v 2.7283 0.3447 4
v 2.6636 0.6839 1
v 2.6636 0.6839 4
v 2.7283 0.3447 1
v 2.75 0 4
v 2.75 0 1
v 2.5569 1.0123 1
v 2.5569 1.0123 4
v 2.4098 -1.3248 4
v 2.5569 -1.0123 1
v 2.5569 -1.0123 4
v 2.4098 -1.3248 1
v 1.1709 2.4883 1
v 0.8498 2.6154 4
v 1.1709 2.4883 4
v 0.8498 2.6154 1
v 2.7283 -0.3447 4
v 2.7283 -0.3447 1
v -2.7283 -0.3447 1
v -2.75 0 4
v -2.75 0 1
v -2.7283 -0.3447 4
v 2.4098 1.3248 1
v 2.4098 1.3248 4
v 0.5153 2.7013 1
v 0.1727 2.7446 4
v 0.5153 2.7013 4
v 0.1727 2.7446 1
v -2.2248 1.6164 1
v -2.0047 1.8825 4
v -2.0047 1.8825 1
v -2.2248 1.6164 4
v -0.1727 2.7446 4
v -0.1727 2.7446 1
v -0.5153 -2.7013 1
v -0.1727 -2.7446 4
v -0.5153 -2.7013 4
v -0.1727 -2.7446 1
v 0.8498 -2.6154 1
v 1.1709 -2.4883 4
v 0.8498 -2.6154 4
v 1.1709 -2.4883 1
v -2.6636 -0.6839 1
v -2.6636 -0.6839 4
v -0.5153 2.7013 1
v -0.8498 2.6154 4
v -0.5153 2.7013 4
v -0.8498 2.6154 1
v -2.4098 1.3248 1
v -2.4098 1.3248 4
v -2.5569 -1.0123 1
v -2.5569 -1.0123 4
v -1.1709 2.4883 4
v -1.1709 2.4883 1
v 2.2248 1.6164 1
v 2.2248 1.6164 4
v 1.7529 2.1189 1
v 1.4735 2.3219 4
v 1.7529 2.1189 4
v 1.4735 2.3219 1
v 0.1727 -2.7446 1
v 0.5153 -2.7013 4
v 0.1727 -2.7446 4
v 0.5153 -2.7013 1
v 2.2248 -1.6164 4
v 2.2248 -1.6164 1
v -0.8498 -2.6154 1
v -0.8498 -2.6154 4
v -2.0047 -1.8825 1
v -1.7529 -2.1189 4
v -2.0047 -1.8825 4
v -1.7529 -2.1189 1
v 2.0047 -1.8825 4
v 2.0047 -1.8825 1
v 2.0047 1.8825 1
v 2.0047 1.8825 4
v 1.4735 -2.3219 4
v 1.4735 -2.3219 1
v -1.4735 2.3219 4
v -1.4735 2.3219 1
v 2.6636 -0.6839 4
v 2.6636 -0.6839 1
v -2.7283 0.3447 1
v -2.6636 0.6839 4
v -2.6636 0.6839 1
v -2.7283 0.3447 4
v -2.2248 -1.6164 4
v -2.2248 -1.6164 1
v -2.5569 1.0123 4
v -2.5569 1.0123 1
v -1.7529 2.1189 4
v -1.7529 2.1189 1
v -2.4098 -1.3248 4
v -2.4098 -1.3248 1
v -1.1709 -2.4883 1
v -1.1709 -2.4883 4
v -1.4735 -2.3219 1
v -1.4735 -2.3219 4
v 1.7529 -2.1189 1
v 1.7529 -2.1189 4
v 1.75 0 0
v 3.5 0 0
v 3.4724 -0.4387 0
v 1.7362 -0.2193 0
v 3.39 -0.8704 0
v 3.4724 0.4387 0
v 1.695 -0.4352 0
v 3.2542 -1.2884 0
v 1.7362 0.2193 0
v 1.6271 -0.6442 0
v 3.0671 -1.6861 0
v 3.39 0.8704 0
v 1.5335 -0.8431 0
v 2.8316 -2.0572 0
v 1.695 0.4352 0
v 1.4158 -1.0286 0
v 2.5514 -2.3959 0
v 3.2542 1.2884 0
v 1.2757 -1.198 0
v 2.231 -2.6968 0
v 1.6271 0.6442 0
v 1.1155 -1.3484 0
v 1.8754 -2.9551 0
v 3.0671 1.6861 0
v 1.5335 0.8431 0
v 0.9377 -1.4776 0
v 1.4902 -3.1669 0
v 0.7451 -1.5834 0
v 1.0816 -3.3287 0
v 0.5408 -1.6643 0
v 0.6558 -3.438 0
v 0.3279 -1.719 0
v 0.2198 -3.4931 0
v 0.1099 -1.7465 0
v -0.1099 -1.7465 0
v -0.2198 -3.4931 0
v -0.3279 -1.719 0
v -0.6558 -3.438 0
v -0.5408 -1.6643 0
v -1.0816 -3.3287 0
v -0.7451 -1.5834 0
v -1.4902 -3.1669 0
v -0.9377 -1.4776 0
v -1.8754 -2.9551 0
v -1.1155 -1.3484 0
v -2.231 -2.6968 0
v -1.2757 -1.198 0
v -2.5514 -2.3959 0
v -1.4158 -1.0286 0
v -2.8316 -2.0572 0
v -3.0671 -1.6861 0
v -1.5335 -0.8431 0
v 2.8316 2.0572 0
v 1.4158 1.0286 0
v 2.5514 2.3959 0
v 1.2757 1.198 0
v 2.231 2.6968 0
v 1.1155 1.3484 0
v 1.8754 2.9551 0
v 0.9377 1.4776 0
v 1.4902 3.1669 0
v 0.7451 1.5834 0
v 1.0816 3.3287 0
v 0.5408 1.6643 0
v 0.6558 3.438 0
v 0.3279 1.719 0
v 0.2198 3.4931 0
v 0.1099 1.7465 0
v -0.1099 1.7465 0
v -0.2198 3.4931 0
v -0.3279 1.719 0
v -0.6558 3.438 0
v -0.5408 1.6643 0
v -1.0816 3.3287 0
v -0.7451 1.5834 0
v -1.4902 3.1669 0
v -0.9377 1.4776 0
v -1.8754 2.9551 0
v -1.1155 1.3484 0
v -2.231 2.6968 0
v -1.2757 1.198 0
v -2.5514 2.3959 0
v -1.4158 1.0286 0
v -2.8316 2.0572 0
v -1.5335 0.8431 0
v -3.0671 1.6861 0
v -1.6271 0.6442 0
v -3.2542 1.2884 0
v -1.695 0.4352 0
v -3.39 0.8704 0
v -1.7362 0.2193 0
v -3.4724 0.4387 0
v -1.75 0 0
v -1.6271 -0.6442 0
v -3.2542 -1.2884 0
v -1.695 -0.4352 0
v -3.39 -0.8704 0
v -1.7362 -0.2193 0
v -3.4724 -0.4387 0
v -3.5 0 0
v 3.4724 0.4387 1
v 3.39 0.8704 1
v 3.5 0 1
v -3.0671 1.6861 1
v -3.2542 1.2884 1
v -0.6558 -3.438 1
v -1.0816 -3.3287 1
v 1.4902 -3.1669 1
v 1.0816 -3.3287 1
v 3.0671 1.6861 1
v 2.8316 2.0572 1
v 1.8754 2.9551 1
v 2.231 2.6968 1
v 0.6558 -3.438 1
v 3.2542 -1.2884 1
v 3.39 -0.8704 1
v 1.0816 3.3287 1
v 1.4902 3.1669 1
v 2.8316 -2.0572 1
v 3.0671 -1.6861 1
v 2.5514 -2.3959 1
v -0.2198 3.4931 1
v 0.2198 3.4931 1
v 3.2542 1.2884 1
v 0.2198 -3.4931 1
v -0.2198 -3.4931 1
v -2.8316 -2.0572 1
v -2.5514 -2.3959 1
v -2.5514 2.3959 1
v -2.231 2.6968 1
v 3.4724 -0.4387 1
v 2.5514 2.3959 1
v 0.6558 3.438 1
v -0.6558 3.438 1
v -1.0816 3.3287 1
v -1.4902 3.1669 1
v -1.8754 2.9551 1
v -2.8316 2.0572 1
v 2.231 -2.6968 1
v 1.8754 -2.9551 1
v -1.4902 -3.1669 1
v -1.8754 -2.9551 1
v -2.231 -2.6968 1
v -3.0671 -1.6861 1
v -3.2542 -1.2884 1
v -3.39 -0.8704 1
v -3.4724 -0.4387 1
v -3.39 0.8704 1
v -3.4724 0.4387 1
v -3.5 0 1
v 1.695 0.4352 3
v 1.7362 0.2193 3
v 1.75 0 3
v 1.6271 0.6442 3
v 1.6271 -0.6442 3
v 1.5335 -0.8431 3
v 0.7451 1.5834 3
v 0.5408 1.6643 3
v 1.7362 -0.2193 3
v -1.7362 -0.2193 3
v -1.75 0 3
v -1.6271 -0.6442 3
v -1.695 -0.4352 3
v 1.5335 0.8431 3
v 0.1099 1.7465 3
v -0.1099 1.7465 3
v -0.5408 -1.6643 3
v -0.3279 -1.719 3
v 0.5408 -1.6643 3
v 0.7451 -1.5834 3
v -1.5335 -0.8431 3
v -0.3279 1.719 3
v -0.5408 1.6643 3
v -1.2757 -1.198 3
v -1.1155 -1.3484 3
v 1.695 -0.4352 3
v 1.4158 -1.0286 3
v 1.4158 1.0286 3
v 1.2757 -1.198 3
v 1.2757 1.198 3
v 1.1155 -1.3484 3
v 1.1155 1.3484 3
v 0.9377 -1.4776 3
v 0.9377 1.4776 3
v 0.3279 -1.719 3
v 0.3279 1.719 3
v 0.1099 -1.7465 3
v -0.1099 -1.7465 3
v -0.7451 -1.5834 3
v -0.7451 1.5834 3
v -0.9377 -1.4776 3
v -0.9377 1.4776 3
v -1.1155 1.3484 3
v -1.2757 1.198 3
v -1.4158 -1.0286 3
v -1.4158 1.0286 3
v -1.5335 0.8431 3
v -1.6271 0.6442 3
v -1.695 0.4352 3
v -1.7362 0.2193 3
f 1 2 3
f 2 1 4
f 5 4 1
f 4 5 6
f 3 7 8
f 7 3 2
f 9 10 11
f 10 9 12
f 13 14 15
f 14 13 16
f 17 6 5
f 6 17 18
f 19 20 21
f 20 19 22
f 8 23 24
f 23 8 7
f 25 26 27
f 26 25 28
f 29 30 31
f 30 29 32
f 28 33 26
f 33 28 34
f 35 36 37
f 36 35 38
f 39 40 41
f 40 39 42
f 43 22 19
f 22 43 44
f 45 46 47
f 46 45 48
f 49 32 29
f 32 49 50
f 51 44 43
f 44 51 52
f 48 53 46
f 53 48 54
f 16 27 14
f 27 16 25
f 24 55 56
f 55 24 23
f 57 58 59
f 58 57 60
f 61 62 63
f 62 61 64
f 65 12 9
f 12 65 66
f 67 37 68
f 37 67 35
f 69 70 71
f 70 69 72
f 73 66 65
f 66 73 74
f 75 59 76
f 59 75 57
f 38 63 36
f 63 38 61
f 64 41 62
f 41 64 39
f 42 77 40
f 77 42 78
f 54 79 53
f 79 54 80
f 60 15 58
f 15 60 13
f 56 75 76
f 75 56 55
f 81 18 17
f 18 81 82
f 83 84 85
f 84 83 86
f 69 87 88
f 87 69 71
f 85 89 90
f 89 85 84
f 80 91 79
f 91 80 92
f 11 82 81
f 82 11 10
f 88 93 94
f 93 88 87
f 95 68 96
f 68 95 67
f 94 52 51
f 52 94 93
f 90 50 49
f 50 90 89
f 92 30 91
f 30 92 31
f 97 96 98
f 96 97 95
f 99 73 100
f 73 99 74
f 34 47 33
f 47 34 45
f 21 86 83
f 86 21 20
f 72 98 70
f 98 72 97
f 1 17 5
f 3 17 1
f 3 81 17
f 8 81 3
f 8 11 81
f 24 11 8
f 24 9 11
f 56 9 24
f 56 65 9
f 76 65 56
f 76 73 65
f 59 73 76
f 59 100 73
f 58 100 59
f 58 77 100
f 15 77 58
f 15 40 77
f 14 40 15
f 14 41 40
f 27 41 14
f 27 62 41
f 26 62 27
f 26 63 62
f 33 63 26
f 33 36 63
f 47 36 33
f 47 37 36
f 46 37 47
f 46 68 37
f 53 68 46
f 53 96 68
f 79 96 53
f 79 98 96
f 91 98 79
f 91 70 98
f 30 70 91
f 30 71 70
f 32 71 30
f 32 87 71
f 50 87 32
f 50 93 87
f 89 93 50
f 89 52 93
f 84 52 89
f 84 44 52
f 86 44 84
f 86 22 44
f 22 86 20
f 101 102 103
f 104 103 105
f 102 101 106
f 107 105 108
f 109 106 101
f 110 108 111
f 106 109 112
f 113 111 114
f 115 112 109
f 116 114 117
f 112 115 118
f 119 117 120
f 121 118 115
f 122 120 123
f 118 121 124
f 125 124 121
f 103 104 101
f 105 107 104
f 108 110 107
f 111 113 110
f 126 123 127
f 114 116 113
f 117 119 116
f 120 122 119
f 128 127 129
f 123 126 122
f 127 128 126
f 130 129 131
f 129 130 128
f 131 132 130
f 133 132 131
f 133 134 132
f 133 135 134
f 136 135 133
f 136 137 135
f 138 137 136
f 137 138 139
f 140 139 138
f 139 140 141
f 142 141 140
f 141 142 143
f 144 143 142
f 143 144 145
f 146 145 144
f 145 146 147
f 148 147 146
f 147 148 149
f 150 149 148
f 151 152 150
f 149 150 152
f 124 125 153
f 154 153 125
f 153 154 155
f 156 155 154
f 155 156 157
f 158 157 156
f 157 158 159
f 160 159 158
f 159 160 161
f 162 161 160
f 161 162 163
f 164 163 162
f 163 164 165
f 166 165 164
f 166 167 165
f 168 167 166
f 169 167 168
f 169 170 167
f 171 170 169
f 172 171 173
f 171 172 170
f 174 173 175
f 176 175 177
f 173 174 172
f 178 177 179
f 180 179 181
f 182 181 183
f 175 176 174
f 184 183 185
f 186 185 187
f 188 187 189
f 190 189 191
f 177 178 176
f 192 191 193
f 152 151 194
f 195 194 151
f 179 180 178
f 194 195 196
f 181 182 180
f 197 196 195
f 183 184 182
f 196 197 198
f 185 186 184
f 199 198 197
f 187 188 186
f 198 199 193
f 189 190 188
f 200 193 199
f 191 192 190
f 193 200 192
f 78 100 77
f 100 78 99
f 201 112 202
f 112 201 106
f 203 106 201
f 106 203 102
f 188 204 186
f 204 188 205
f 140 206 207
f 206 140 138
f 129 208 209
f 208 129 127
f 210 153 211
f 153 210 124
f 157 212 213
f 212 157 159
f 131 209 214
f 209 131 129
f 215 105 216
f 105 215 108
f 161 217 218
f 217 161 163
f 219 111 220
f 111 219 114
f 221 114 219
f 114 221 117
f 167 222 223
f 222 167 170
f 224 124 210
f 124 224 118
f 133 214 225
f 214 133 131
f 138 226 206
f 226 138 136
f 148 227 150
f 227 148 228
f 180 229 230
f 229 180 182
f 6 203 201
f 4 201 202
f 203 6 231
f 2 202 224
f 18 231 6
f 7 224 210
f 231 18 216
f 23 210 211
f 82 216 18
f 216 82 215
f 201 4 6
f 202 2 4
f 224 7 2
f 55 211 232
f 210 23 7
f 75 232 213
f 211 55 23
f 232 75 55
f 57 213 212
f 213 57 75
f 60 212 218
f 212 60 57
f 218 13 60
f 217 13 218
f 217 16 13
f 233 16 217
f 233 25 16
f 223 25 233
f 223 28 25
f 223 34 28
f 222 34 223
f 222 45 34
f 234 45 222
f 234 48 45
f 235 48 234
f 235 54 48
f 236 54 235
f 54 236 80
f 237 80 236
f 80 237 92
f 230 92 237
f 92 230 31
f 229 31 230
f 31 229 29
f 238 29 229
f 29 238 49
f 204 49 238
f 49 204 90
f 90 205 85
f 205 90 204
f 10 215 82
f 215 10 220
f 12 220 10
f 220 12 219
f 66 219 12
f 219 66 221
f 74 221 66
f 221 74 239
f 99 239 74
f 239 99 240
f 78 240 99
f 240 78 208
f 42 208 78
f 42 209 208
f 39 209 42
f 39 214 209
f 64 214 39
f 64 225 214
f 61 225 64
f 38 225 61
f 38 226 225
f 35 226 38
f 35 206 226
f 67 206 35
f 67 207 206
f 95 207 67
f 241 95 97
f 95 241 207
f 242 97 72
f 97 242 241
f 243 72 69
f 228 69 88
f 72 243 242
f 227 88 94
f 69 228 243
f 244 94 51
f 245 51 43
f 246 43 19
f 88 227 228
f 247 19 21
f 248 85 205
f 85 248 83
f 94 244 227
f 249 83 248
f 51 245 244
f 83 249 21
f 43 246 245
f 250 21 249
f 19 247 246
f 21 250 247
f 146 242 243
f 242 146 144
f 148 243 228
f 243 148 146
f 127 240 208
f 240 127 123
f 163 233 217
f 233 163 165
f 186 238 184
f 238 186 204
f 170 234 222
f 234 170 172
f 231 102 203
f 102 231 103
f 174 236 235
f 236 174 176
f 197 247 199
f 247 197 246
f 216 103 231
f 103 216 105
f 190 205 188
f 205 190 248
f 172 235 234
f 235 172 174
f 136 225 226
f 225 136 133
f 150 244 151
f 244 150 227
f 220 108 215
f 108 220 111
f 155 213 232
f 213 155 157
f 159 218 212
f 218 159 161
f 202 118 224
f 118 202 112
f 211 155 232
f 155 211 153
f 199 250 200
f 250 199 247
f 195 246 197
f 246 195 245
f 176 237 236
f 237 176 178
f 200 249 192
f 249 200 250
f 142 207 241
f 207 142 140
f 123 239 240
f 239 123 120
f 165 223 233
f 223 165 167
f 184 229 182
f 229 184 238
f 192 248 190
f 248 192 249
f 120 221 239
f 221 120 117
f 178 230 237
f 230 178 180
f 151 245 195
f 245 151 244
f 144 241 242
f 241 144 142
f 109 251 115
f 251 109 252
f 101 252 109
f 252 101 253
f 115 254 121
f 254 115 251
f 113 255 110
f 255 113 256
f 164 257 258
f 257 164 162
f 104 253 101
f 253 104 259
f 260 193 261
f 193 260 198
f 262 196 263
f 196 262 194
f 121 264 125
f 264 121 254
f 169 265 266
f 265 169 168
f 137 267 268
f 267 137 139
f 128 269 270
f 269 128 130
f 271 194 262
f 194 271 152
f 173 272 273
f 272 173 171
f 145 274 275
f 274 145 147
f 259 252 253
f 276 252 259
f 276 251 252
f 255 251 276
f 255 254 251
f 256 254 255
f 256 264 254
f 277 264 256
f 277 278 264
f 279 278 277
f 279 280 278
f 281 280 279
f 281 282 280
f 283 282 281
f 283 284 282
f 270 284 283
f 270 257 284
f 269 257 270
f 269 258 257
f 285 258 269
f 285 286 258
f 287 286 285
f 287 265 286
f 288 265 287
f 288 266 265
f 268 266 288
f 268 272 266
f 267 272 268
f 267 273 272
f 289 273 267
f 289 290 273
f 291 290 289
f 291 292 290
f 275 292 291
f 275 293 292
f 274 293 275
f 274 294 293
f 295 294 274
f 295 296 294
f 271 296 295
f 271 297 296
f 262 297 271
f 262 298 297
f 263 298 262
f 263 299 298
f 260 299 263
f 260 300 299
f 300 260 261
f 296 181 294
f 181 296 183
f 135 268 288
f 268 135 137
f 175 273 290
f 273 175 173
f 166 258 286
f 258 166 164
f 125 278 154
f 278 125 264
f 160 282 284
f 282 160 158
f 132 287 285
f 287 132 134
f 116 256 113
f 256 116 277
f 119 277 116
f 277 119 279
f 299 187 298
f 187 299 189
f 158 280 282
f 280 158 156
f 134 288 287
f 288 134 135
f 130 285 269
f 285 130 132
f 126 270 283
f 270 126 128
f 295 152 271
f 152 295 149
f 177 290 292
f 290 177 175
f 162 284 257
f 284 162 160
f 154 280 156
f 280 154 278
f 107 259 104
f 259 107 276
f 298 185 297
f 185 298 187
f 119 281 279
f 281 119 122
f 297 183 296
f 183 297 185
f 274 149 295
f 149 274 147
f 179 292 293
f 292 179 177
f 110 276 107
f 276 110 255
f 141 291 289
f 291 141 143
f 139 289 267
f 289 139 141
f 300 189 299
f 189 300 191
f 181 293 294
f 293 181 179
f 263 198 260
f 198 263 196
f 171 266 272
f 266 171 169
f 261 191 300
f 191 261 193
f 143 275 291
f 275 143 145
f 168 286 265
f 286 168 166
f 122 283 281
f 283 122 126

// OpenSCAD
$fn=50;

difference() {
    union() {
        cylinder(h=4, d=5.5);
        cylinder(h=1, d=7);
    }
    cylinder(h=3, d=3.5);
}
